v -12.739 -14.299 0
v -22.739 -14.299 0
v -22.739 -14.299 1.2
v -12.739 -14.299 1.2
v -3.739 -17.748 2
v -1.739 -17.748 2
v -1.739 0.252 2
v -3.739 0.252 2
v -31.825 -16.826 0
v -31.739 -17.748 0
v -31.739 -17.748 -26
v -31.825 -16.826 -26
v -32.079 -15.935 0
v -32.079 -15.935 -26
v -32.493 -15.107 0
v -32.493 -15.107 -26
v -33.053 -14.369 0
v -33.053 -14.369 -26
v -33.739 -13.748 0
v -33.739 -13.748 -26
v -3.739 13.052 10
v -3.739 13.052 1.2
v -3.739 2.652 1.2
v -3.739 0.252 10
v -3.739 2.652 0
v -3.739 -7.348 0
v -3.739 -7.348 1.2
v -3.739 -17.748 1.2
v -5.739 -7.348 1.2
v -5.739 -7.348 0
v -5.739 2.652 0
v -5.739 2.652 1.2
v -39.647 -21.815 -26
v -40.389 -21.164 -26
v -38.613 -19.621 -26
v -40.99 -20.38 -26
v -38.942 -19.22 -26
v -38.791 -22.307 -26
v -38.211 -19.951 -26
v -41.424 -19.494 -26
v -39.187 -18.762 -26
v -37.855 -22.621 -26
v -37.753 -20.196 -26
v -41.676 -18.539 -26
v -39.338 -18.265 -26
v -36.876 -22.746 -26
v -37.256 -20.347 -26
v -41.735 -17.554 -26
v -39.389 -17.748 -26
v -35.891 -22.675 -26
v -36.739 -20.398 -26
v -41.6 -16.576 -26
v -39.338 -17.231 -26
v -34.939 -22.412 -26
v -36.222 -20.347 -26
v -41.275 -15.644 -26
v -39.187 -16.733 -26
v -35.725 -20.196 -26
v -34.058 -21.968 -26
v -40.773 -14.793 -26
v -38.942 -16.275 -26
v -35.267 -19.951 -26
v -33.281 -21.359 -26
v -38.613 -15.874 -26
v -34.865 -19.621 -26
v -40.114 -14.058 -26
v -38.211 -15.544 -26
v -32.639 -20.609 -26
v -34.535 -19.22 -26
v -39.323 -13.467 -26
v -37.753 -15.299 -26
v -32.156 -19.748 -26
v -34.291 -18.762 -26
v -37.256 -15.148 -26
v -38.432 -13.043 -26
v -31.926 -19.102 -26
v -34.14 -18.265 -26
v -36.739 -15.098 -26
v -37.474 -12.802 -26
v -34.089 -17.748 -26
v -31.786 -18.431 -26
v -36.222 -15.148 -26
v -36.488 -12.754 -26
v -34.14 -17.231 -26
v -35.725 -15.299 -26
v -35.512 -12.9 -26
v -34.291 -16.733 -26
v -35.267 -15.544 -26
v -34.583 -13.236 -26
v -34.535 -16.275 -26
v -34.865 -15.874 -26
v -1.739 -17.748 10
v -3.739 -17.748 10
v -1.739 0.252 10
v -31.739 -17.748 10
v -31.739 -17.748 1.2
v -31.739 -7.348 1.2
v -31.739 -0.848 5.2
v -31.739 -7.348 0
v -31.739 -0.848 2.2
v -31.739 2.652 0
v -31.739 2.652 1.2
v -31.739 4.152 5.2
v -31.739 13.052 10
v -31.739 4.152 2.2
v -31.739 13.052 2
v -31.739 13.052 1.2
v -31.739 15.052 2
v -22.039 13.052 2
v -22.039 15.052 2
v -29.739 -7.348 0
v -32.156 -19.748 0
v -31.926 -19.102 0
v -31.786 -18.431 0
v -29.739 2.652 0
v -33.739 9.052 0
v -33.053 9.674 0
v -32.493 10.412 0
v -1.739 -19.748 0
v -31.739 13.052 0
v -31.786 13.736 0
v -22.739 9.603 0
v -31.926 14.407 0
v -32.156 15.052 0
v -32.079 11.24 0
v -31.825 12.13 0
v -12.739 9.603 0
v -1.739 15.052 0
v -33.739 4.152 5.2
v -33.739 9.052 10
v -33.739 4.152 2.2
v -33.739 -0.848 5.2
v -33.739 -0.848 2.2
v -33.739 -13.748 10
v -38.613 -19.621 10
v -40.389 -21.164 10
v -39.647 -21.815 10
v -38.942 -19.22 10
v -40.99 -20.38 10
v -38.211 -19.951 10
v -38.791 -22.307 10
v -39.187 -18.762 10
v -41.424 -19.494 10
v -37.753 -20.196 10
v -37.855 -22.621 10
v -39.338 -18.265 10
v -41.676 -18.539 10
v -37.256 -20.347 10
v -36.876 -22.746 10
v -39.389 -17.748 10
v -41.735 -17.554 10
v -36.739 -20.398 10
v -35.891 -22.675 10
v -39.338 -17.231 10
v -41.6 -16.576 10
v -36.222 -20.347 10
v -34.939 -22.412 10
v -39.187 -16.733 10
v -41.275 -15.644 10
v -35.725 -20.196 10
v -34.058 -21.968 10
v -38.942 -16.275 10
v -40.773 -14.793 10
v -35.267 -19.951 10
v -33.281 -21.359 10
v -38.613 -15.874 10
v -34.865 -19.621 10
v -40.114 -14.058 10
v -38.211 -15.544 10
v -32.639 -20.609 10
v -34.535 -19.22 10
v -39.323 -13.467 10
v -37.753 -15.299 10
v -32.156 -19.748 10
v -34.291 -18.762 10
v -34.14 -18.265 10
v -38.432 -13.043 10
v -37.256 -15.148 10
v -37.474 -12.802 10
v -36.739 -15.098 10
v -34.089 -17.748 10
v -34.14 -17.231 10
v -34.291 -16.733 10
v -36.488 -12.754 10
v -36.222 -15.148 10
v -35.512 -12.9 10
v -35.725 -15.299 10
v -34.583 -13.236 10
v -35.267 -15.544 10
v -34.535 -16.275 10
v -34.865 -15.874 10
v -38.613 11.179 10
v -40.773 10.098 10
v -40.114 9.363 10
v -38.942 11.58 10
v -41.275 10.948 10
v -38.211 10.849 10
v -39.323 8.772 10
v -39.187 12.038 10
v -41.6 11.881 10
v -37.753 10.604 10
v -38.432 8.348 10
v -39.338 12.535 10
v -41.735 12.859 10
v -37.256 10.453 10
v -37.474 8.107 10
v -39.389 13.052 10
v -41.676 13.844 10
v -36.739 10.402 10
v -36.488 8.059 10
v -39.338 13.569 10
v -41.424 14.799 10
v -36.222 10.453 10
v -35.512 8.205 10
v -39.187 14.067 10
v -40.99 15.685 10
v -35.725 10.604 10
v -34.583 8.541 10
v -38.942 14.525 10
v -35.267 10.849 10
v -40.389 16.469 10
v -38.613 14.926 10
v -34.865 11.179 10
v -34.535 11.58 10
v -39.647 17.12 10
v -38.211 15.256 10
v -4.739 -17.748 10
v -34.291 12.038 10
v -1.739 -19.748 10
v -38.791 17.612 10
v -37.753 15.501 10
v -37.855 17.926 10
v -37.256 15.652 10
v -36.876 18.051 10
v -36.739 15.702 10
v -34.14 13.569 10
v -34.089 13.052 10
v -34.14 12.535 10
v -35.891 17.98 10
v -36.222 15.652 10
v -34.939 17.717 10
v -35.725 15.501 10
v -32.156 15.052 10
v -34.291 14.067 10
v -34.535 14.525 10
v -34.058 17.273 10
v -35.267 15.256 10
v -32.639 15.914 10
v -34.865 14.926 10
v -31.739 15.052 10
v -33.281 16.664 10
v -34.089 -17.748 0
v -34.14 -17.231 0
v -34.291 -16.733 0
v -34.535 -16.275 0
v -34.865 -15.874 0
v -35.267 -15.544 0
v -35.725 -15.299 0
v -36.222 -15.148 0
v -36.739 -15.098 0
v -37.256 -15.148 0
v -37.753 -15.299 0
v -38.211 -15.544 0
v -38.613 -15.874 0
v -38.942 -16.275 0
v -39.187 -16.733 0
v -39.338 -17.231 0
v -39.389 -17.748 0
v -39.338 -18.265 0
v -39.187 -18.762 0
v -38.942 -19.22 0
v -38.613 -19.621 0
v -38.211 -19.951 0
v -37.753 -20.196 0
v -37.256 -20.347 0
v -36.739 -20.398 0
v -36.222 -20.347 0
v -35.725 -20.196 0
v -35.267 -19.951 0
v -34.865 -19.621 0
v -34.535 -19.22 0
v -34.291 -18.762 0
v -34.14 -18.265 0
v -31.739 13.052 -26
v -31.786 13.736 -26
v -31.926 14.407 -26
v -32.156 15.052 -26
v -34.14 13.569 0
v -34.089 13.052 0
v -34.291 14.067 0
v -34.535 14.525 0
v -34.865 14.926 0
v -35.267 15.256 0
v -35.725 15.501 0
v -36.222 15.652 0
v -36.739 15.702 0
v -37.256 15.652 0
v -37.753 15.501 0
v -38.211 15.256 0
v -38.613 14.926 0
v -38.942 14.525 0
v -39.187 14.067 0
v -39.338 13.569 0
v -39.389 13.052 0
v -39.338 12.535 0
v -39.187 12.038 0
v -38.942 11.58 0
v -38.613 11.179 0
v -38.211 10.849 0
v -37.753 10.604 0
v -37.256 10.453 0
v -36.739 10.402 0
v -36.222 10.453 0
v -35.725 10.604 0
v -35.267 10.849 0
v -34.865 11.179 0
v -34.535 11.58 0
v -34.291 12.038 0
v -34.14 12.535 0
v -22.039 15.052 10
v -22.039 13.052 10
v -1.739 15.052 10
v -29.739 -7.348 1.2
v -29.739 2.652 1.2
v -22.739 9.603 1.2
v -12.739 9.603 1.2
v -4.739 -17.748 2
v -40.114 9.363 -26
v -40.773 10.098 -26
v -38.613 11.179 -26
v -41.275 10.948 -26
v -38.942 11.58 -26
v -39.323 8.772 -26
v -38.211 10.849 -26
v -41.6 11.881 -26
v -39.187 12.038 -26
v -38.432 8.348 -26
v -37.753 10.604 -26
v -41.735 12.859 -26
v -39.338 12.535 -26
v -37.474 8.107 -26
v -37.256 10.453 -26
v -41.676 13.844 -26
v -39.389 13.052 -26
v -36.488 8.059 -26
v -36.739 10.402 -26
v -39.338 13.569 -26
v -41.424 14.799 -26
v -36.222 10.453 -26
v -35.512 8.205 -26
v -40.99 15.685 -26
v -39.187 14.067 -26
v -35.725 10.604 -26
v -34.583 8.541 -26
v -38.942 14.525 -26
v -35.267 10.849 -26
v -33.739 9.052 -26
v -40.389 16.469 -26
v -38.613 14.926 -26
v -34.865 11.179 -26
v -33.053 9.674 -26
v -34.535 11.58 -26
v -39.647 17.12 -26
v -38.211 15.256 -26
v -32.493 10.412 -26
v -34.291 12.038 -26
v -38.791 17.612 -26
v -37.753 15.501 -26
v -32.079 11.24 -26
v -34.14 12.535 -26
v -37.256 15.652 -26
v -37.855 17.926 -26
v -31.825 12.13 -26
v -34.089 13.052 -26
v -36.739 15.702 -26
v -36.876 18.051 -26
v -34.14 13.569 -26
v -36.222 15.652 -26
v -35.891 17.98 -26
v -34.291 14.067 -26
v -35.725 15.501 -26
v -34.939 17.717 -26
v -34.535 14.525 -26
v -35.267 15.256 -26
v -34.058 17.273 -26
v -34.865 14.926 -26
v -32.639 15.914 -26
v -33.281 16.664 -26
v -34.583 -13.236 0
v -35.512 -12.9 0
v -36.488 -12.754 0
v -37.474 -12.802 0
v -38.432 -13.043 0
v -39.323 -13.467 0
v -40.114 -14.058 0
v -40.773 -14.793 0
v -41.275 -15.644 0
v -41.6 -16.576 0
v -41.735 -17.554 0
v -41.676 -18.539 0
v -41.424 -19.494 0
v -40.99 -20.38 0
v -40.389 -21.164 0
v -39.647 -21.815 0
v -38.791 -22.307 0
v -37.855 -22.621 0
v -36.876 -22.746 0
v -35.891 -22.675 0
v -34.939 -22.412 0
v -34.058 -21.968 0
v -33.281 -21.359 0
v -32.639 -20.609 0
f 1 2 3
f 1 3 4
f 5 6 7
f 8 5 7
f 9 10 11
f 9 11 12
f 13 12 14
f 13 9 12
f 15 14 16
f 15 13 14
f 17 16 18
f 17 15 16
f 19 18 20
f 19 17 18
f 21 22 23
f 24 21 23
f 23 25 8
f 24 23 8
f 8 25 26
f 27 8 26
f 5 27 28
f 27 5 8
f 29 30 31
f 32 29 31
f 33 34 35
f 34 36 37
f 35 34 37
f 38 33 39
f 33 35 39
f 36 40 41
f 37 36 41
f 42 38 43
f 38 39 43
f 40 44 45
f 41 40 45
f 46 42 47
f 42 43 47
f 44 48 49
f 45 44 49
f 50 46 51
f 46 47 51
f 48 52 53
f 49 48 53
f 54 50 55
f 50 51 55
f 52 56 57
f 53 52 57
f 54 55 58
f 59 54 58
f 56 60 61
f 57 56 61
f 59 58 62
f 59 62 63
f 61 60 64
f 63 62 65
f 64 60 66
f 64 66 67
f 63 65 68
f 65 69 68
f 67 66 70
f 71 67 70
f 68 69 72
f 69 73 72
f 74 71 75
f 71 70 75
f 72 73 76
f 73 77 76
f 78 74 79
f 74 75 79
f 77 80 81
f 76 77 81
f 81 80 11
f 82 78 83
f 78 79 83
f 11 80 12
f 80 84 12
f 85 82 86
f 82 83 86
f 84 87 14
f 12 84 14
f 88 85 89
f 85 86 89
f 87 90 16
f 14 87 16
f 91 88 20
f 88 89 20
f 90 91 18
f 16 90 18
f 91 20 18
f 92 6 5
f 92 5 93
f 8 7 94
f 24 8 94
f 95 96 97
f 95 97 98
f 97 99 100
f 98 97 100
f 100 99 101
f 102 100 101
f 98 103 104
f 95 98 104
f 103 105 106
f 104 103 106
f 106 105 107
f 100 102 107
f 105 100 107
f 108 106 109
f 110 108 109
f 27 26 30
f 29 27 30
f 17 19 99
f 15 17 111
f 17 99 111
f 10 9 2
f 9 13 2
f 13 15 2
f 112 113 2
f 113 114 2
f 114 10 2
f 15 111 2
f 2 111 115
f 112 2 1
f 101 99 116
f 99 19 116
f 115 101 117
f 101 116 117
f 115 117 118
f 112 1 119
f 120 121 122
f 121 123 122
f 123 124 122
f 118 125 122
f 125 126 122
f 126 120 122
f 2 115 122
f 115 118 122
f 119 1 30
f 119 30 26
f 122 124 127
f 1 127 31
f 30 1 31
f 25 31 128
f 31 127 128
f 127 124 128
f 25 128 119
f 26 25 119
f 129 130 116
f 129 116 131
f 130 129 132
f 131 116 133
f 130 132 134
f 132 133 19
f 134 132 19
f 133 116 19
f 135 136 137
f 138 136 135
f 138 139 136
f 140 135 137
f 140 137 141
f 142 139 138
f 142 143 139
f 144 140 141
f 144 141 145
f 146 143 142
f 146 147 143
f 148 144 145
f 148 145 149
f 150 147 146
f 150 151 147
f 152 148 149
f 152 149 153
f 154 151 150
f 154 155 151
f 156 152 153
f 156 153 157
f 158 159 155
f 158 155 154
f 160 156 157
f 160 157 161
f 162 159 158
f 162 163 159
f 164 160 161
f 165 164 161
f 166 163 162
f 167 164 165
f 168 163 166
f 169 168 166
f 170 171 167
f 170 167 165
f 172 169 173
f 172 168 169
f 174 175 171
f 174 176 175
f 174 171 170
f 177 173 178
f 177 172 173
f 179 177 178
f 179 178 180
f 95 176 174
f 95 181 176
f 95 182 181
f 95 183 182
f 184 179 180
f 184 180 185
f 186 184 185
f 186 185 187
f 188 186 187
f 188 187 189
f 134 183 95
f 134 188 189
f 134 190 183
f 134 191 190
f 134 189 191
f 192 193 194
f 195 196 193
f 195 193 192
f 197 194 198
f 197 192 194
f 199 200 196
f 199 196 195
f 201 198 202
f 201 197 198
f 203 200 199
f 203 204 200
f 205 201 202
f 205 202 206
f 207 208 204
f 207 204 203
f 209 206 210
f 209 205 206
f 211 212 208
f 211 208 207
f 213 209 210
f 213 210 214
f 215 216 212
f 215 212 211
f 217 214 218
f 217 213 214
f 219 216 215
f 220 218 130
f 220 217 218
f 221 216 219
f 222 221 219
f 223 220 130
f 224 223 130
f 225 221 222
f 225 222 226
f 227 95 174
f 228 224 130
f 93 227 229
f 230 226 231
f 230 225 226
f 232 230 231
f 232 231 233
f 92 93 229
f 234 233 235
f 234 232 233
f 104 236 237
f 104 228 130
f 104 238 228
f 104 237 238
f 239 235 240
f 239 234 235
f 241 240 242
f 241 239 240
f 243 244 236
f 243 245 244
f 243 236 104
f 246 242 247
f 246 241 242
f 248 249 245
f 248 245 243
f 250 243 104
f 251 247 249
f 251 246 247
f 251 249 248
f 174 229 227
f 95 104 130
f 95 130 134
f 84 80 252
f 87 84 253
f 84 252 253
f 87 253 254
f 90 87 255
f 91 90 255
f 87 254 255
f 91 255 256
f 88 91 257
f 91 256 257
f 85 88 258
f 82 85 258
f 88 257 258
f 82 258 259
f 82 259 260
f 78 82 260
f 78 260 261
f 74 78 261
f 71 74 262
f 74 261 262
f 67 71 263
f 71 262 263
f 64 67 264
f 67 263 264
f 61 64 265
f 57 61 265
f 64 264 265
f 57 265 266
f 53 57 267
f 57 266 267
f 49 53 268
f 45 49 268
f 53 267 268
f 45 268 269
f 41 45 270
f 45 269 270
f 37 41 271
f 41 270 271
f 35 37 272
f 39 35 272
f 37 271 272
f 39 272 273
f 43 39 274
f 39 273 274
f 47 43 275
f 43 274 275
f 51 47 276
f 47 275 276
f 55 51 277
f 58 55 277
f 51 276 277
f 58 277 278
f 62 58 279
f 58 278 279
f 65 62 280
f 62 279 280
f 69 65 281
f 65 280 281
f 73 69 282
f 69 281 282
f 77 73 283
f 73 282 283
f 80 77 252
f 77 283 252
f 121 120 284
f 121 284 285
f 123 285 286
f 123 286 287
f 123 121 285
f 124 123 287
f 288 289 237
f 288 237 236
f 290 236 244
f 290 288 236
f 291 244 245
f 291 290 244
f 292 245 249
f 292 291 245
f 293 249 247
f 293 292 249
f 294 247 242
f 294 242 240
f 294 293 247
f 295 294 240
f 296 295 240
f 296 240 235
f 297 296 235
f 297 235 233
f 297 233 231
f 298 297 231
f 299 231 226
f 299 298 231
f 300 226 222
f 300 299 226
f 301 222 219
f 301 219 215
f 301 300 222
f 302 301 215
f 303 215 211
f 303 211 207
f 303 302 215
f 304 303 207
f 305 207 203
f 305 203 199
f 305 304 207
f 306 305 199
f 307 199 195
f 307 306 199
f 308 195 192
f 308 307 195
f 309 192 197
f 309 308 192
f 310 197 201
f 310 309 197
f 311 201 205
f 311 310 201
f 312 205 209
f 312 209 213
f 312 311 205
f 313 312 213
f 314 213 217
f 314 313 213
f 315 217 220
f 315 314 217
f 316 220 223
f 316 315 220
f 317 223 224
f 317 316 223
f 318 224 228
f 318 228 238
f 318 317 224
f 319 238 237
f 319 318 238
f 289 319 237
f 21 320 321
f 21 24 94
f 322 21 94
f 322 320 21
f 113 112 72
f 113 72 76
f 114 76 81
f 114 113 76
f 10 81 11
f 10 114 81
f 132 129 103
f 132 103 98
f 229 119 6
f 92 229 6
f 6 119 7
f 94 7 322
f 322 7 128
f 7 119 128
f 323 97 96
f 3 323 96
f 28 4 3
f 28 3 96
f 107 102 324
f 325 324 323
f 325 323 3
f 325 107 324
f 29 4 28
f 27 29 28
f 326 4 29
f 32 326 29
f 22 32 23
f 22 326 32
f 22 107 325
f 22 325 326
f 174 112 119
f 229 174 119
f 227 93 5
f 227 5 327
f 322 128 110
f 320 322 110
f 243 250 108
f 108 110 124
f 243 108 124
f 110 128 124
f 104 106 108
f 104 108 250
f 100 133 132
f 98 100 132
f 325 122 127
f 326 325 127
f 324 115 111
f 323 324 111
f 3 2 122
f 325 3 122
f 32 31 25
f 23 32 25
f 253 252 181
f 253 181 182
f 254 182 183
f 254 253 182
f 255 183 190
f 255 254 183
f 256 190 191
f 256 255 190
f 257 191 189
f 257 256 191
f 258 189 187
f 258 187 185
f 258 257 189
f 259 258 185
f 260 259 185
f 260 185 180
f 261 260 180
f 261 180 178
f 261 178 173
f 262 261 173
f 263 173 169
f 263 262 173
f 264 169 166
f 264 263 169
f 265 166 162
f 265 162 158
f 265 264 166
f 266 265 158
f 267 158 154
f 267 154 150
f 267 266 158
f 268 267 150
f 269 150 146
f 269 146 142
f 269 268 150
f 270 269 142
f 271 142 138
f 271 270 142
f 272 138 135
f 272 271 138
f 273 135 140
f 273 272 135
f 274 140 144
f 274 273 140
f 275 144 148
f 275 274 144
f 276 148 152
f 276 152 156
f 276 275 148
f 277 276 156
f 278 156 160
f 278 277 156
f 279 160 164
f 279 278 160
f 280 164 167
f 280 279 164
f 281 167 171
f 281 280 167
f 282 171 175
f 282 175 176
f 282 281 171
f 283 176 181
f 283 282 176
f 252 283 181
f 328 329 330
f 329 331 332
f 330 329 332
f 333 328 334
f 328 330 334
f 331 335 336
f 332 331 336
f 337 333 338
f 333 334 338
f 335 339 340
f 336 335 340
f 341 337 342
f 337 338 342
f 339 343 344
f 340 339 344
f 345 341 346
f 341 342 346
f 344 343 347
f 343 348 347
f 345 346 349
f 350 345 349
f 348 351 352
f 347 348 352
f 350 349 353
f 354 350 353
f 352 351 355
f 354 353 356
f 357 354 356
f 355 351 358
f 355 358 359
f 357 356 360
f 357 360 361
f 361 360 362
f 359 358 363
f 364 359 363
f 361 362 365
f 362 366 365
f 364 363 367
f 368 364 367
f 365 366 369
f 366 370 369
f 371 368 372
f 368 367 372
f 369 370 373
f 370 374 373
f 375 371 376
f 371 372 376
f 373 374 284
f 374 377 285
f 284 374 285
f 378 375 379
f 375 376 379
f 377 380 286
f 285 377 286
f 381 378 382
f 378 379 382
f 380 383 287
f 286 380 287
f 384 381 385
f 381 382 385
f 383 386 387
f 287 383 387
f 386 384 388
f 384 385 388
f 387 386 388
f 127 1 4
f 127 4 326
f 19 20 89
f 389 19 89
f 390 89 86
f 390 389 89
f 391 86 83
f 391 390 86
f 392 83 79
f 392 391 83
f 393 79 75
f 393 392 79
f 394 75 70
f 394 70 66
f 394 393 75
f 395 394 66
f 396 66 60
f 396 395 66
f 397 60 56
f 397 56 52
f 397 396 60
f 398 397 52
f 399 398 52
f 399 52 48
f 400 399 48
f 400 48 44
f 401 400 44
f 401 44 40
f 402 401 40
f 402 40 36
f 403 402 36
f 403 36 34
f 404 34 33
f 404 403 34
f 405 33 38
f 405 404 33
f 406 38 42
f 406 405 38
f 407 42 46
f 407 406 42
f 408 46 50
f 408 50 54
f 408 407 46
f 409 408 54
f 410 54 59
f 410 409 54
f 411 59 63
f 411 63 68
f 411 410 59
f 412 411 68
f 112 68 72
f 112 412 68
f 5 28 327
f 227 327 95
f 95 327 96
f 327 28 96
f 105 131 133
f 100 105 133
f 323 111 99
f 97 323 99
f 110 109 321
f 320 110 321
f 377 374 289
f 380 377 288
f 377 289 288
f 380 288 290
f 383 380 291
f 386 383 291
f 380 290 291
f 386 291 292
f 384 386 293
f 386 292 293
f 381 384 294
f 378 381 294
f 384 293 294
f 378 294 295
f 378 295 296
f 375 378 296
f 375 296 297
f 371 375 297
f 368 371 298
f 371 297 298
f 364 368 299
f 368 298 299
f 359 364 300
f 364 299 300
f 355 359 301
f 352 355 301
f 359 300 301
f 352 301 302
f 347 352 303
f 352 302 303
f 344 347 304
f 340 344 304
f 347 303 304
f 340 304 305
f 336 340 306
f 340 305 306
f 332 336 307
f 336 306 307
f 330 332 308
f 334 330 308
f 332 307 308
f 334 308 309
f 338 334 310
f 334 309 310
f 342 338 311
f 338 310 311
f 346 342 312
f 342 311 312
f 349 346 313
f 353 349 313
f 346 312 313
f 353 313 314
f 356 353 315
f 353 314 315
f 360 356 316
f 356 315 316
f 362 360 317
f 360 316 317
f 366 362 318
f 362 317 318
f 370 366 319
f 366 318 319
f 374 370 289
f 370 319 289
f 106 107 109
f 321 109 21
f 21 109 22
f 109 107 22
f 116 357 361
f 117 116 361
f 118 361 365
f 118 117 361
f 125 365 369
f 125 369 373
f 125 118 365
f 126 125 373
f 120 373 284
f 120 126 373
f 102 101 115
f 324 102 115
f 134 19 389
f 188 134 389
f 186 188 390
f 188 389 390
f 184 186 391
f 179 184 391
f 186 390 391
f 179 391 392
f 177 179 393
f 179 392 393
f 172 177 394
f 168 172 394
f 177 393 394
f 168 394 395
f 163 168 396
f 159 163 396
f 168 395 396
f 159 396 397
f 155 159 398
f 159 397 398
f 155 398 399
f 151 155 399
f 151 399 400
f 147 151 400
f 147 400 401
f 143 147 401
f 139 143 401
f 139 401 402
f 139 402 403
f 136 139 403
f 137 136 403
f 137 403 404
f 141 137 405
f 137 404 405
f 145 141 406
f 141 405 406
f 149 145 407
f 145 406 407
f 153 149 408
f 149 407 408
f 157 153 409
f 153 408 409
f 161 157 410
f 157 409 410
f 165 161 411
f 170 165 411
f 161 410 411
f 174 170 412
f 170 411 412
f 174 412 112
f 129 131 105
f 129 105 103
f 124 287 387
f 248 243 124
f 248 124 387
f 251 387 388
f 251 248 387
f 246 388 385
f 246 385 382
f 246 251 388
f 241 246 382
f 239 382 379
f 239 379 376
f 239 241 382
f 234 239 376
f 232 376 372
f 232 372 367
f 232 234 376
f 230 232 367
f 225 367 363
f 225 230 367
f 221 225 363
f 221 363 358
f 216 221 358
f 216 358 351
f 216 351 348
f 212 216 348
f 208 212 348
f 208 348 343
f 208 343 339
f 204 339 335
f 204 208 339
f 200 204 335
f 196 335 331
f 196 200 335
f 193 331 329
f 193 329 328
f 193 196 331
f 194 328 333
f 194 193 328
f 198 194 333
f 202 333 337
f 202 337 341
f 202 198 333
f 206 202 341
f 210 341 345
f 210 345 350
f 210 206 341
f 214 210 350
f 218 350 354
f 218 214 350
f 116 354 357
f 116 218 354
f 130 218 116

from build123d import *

# Parameters (mm, degrees)
F0_W      = 10
F0_H      = 23.902074
F1_DEPTH  = 1.2
F2_DEPTH  = 10
F0_R      = 2.65
F3_DEPTH  = 10
F4_DEPTH  = 26
F5_W      = 18
F5_H      = 8
F6_DEPTH  = 3
F7_W      = 9.7
F7_H      = 8
F8_DEPTH  = 25
F9_W      = 5
F9_H      = 3
F10_DEPTH = 4


with BuildPart() as f1:
    # F0 (on Top) → F1 (new body)
    with BuildSketch(Plane.XY):
        Polygon((-31.738877, -7.347546), (-31.738877, -17.747546), (-3.738877, -17.747546), (-3.738877, -7.347546), (-5.738877, -7.347546), (-5.738877, 2.652454), (-3.738877, 2.652454), (-3.738877, 13.052454), (-31.738877, 13.052454), (-31.738877, 2.652454), (-29.738877, 2.652454), (-29.738877, -7.347546), align=None)
        with Locations((-17.738877, -2.347546)):
            Rectangle(F0_W, F0_H, mode=Mode.SUBTRACT)
    extrude(amount=F1_DEPTH)

    # F0 (on Top) → F2 (join)
    with BuildSketch(Plane.XY):
        with BuildLine():
            Line((-3.738877, -17.747546), (-31.738877, -17.747546))
            ThreePointArc((-31.738877, -17.747546), (-31.844346, -18.769095), (-32.156302, -19.747546))
            Line((-32.156302, -19.747546), (-1.738877, -19.747546))
            Line((-1.738877, -19.747546), (-1.738877, 15.052454))
            Line((-1.738877, 15.052454), (-32.156302, 15.052454))
            ThreePointArc((-32.156302, 15.052454), (-31.844346, 14.074002), (-31.738877, 13.052454))
            Line((-31.738877, 13.052454), (-3.738877, 13.052454))
            Line((-3.738877, 13.052454), (-3.738877, 2.652454))
            Line((-3.738877, 2.652454), (-3.738877, -7.347546))
            Line((-3.738877, -7.347546), (-3.738877, -17.747546))
        make_face()
        with BuildLine():
            ThreePointArc((-33.738877, -13.747546), (-32.266741, -15.511478), (-31.738877, -17.747546))
            Line((-31.738877, -17.747546), (-31.738877, -7.347546))
            Line((-31.738877, -7.347546), (-31.738877, 2.652454))
            Line((-31.738877, 2.652454), (-31.738877, 13.052454))
            ThreePointArc((-31.738877, 13.052454), (-32.266741, 10.816386), (-33.738877, 9.052454))
            Line((-33.738877, 9.052454), (-33.738877, -13.747546))
        make_face()
        with BuildLine():
            Line((-33.738877, 15.052454), (-33.738877, 9.052454))
            ThreePointArc((-33.738877, 9.052454), (-32.266741, 10.816386), (-31.738877, 13.052454))
            ThreePointArc((-31.738877, 13.052454), (-31.844346, 14.074002), (-32.156302, 15.052454))
            Line((-32.156302, 15.052454), (-33.738877, 15.052454))
        make_face()
        with BuildLine():
            ThreePointArc((-32.156302, -19.747546), (-31.844346, -18.769095), (-31.738877, -17.747546))
            ThreePointArc((-31.738877, -17.747546), (-32.266741, -15.511478), (-33.738877, -13.747546))
            Line((-33.738877, -13.747546), (-33.738877, -19.747546))
            Line((-33.738877, -19.747546), (-32.156302, -19.747546))
        make_face()
    extrude(amount=F2_DEPTH)

    # F0 (on Top) → F3 (join)
    with BuildSketch(Plane.XY):
        with BuildLine():
            ThreePointArc((-32.156302, 15.052454), (-41.57353, 14.327654), (-33.738877, 9.052454))
            Line((-33.738877, 9.052454), (-33.738877, 15.052454))
            Line((-33.738877, 15.052454), (-32.156302, 15.052454))
        make_face()
        with Locations((-36.738877, 13.052454)):
            Circle(F0_R, mode=Mode.SUBTRACT)
        with BuildLine():
            Line((-33.738877, -19.747546), (-33.738877, -13.747546))
            ThreePointArc((-33.738877, -13.747546), (-41.57353, -19.022747), (-32.156302, -19.747546))
            Line((-32.156302, -19.747546), (-33.738877, -19.747546))
        make_face()
        with Locations((-36.738877, -17.747546)):
            Circle(F0_R, mode=Mode.SUBTRACT)
    extrude(amount=F3_DEPTH)

    # F0 (on Top) → F4 (join)
    with BuildSketch(Plane.XY):
        with BuildLine():
            ThreePointArc((-32.156302, 15.052454), (-41.57353, 14.327654), (-33.738877, 9.052454))
            Line((-33.738877, 9.052454), (-33.738877, 15.052454))
            Line((-33.738877, 15.052454), (-32.156302, 15.052454))
        make_face()
        with Locations((-36.738877, 13.052454)):
            Circle(F0_R, mode=Mode.SUBTRACT)
        with BuildLine():
            Line((-33.738877, 15.052454), (-33.738877, 9.052454))
            ThreePointArc((-33.738877, 9.052454), (-32.266741, 10.816386), (-31.738877, 13.052454))
            ThreePointArc((-31.738877, 13.052454), (-31.844346, 14.074002), (-32.156302, 15.052454))
            Line((-32.156302, 15.052454), (-33.738877, 15.052454))
        make_face()
        with BuildLine():
            Line((-33.738877, -19.747546), (-33.738877, -13.747546))
            ThreePointArc((-33.738877, -13.747546), (-41.57353, -19.022747), (-32.156302, -19.747546))
            Line((-32.156302, -19.747546), (-33.738877, -19.747546))
        make_face()
        with Locations((-36.738877, -17.747546)):
            Circle(F0_R, mode=Mode.SUBTRACT)
        with BuildLine():
            ThreePointArc((-32.156302, -19.747546), (-31.844346, -18.769095), (-31.738877, -17.747546))
            ThreePointArc((-31.738877, -17.747546), (-32.266741, -15.511478), (-33.738877, -13.747546))
            Line((-33.738877, -13.747546), (-33.738877, -19.747546))
            Line((-33.738877, -19.747546), (-32.156302, -19.747546))
        make_face()
    extrude(amount=-F4_DEPTH)

    # F5 (on face) → F6 (cut)
    with BuildSketch(Plane.YZ.offset(-1.738877)):
        with Locations((-8.747546, 6)):
            Rectangle(F5_W, F5_H)
    extrude(amount=-F6_DEPTH, mode=Mode.SUBTRACT)

    # F7 (on face) → F8 (cut)
    with BuildSketch(Plane.XZ.offset(-13.052454)):
        with Locations((-26.888877, 6)):
            Rectangle(F7_W, F7_H)
    extrude(amount=-F8_DEPTH, mode=Mode.SUBTRACT)

    # F9 (on face) → F10 (cut)
    with BuildSketch(Plane(origin=(-33.738877, 0, 0), x_dir=(0, -1, 0), z_dir=(-1, 0, 0))):
        with Locations((-1.652454, 3.7)):
            Rectangle(F9_W, F9_H)
    extrude(amount=-F10_DEPTH, mode=Mode.SUBTRACT)


solid = f1.part
